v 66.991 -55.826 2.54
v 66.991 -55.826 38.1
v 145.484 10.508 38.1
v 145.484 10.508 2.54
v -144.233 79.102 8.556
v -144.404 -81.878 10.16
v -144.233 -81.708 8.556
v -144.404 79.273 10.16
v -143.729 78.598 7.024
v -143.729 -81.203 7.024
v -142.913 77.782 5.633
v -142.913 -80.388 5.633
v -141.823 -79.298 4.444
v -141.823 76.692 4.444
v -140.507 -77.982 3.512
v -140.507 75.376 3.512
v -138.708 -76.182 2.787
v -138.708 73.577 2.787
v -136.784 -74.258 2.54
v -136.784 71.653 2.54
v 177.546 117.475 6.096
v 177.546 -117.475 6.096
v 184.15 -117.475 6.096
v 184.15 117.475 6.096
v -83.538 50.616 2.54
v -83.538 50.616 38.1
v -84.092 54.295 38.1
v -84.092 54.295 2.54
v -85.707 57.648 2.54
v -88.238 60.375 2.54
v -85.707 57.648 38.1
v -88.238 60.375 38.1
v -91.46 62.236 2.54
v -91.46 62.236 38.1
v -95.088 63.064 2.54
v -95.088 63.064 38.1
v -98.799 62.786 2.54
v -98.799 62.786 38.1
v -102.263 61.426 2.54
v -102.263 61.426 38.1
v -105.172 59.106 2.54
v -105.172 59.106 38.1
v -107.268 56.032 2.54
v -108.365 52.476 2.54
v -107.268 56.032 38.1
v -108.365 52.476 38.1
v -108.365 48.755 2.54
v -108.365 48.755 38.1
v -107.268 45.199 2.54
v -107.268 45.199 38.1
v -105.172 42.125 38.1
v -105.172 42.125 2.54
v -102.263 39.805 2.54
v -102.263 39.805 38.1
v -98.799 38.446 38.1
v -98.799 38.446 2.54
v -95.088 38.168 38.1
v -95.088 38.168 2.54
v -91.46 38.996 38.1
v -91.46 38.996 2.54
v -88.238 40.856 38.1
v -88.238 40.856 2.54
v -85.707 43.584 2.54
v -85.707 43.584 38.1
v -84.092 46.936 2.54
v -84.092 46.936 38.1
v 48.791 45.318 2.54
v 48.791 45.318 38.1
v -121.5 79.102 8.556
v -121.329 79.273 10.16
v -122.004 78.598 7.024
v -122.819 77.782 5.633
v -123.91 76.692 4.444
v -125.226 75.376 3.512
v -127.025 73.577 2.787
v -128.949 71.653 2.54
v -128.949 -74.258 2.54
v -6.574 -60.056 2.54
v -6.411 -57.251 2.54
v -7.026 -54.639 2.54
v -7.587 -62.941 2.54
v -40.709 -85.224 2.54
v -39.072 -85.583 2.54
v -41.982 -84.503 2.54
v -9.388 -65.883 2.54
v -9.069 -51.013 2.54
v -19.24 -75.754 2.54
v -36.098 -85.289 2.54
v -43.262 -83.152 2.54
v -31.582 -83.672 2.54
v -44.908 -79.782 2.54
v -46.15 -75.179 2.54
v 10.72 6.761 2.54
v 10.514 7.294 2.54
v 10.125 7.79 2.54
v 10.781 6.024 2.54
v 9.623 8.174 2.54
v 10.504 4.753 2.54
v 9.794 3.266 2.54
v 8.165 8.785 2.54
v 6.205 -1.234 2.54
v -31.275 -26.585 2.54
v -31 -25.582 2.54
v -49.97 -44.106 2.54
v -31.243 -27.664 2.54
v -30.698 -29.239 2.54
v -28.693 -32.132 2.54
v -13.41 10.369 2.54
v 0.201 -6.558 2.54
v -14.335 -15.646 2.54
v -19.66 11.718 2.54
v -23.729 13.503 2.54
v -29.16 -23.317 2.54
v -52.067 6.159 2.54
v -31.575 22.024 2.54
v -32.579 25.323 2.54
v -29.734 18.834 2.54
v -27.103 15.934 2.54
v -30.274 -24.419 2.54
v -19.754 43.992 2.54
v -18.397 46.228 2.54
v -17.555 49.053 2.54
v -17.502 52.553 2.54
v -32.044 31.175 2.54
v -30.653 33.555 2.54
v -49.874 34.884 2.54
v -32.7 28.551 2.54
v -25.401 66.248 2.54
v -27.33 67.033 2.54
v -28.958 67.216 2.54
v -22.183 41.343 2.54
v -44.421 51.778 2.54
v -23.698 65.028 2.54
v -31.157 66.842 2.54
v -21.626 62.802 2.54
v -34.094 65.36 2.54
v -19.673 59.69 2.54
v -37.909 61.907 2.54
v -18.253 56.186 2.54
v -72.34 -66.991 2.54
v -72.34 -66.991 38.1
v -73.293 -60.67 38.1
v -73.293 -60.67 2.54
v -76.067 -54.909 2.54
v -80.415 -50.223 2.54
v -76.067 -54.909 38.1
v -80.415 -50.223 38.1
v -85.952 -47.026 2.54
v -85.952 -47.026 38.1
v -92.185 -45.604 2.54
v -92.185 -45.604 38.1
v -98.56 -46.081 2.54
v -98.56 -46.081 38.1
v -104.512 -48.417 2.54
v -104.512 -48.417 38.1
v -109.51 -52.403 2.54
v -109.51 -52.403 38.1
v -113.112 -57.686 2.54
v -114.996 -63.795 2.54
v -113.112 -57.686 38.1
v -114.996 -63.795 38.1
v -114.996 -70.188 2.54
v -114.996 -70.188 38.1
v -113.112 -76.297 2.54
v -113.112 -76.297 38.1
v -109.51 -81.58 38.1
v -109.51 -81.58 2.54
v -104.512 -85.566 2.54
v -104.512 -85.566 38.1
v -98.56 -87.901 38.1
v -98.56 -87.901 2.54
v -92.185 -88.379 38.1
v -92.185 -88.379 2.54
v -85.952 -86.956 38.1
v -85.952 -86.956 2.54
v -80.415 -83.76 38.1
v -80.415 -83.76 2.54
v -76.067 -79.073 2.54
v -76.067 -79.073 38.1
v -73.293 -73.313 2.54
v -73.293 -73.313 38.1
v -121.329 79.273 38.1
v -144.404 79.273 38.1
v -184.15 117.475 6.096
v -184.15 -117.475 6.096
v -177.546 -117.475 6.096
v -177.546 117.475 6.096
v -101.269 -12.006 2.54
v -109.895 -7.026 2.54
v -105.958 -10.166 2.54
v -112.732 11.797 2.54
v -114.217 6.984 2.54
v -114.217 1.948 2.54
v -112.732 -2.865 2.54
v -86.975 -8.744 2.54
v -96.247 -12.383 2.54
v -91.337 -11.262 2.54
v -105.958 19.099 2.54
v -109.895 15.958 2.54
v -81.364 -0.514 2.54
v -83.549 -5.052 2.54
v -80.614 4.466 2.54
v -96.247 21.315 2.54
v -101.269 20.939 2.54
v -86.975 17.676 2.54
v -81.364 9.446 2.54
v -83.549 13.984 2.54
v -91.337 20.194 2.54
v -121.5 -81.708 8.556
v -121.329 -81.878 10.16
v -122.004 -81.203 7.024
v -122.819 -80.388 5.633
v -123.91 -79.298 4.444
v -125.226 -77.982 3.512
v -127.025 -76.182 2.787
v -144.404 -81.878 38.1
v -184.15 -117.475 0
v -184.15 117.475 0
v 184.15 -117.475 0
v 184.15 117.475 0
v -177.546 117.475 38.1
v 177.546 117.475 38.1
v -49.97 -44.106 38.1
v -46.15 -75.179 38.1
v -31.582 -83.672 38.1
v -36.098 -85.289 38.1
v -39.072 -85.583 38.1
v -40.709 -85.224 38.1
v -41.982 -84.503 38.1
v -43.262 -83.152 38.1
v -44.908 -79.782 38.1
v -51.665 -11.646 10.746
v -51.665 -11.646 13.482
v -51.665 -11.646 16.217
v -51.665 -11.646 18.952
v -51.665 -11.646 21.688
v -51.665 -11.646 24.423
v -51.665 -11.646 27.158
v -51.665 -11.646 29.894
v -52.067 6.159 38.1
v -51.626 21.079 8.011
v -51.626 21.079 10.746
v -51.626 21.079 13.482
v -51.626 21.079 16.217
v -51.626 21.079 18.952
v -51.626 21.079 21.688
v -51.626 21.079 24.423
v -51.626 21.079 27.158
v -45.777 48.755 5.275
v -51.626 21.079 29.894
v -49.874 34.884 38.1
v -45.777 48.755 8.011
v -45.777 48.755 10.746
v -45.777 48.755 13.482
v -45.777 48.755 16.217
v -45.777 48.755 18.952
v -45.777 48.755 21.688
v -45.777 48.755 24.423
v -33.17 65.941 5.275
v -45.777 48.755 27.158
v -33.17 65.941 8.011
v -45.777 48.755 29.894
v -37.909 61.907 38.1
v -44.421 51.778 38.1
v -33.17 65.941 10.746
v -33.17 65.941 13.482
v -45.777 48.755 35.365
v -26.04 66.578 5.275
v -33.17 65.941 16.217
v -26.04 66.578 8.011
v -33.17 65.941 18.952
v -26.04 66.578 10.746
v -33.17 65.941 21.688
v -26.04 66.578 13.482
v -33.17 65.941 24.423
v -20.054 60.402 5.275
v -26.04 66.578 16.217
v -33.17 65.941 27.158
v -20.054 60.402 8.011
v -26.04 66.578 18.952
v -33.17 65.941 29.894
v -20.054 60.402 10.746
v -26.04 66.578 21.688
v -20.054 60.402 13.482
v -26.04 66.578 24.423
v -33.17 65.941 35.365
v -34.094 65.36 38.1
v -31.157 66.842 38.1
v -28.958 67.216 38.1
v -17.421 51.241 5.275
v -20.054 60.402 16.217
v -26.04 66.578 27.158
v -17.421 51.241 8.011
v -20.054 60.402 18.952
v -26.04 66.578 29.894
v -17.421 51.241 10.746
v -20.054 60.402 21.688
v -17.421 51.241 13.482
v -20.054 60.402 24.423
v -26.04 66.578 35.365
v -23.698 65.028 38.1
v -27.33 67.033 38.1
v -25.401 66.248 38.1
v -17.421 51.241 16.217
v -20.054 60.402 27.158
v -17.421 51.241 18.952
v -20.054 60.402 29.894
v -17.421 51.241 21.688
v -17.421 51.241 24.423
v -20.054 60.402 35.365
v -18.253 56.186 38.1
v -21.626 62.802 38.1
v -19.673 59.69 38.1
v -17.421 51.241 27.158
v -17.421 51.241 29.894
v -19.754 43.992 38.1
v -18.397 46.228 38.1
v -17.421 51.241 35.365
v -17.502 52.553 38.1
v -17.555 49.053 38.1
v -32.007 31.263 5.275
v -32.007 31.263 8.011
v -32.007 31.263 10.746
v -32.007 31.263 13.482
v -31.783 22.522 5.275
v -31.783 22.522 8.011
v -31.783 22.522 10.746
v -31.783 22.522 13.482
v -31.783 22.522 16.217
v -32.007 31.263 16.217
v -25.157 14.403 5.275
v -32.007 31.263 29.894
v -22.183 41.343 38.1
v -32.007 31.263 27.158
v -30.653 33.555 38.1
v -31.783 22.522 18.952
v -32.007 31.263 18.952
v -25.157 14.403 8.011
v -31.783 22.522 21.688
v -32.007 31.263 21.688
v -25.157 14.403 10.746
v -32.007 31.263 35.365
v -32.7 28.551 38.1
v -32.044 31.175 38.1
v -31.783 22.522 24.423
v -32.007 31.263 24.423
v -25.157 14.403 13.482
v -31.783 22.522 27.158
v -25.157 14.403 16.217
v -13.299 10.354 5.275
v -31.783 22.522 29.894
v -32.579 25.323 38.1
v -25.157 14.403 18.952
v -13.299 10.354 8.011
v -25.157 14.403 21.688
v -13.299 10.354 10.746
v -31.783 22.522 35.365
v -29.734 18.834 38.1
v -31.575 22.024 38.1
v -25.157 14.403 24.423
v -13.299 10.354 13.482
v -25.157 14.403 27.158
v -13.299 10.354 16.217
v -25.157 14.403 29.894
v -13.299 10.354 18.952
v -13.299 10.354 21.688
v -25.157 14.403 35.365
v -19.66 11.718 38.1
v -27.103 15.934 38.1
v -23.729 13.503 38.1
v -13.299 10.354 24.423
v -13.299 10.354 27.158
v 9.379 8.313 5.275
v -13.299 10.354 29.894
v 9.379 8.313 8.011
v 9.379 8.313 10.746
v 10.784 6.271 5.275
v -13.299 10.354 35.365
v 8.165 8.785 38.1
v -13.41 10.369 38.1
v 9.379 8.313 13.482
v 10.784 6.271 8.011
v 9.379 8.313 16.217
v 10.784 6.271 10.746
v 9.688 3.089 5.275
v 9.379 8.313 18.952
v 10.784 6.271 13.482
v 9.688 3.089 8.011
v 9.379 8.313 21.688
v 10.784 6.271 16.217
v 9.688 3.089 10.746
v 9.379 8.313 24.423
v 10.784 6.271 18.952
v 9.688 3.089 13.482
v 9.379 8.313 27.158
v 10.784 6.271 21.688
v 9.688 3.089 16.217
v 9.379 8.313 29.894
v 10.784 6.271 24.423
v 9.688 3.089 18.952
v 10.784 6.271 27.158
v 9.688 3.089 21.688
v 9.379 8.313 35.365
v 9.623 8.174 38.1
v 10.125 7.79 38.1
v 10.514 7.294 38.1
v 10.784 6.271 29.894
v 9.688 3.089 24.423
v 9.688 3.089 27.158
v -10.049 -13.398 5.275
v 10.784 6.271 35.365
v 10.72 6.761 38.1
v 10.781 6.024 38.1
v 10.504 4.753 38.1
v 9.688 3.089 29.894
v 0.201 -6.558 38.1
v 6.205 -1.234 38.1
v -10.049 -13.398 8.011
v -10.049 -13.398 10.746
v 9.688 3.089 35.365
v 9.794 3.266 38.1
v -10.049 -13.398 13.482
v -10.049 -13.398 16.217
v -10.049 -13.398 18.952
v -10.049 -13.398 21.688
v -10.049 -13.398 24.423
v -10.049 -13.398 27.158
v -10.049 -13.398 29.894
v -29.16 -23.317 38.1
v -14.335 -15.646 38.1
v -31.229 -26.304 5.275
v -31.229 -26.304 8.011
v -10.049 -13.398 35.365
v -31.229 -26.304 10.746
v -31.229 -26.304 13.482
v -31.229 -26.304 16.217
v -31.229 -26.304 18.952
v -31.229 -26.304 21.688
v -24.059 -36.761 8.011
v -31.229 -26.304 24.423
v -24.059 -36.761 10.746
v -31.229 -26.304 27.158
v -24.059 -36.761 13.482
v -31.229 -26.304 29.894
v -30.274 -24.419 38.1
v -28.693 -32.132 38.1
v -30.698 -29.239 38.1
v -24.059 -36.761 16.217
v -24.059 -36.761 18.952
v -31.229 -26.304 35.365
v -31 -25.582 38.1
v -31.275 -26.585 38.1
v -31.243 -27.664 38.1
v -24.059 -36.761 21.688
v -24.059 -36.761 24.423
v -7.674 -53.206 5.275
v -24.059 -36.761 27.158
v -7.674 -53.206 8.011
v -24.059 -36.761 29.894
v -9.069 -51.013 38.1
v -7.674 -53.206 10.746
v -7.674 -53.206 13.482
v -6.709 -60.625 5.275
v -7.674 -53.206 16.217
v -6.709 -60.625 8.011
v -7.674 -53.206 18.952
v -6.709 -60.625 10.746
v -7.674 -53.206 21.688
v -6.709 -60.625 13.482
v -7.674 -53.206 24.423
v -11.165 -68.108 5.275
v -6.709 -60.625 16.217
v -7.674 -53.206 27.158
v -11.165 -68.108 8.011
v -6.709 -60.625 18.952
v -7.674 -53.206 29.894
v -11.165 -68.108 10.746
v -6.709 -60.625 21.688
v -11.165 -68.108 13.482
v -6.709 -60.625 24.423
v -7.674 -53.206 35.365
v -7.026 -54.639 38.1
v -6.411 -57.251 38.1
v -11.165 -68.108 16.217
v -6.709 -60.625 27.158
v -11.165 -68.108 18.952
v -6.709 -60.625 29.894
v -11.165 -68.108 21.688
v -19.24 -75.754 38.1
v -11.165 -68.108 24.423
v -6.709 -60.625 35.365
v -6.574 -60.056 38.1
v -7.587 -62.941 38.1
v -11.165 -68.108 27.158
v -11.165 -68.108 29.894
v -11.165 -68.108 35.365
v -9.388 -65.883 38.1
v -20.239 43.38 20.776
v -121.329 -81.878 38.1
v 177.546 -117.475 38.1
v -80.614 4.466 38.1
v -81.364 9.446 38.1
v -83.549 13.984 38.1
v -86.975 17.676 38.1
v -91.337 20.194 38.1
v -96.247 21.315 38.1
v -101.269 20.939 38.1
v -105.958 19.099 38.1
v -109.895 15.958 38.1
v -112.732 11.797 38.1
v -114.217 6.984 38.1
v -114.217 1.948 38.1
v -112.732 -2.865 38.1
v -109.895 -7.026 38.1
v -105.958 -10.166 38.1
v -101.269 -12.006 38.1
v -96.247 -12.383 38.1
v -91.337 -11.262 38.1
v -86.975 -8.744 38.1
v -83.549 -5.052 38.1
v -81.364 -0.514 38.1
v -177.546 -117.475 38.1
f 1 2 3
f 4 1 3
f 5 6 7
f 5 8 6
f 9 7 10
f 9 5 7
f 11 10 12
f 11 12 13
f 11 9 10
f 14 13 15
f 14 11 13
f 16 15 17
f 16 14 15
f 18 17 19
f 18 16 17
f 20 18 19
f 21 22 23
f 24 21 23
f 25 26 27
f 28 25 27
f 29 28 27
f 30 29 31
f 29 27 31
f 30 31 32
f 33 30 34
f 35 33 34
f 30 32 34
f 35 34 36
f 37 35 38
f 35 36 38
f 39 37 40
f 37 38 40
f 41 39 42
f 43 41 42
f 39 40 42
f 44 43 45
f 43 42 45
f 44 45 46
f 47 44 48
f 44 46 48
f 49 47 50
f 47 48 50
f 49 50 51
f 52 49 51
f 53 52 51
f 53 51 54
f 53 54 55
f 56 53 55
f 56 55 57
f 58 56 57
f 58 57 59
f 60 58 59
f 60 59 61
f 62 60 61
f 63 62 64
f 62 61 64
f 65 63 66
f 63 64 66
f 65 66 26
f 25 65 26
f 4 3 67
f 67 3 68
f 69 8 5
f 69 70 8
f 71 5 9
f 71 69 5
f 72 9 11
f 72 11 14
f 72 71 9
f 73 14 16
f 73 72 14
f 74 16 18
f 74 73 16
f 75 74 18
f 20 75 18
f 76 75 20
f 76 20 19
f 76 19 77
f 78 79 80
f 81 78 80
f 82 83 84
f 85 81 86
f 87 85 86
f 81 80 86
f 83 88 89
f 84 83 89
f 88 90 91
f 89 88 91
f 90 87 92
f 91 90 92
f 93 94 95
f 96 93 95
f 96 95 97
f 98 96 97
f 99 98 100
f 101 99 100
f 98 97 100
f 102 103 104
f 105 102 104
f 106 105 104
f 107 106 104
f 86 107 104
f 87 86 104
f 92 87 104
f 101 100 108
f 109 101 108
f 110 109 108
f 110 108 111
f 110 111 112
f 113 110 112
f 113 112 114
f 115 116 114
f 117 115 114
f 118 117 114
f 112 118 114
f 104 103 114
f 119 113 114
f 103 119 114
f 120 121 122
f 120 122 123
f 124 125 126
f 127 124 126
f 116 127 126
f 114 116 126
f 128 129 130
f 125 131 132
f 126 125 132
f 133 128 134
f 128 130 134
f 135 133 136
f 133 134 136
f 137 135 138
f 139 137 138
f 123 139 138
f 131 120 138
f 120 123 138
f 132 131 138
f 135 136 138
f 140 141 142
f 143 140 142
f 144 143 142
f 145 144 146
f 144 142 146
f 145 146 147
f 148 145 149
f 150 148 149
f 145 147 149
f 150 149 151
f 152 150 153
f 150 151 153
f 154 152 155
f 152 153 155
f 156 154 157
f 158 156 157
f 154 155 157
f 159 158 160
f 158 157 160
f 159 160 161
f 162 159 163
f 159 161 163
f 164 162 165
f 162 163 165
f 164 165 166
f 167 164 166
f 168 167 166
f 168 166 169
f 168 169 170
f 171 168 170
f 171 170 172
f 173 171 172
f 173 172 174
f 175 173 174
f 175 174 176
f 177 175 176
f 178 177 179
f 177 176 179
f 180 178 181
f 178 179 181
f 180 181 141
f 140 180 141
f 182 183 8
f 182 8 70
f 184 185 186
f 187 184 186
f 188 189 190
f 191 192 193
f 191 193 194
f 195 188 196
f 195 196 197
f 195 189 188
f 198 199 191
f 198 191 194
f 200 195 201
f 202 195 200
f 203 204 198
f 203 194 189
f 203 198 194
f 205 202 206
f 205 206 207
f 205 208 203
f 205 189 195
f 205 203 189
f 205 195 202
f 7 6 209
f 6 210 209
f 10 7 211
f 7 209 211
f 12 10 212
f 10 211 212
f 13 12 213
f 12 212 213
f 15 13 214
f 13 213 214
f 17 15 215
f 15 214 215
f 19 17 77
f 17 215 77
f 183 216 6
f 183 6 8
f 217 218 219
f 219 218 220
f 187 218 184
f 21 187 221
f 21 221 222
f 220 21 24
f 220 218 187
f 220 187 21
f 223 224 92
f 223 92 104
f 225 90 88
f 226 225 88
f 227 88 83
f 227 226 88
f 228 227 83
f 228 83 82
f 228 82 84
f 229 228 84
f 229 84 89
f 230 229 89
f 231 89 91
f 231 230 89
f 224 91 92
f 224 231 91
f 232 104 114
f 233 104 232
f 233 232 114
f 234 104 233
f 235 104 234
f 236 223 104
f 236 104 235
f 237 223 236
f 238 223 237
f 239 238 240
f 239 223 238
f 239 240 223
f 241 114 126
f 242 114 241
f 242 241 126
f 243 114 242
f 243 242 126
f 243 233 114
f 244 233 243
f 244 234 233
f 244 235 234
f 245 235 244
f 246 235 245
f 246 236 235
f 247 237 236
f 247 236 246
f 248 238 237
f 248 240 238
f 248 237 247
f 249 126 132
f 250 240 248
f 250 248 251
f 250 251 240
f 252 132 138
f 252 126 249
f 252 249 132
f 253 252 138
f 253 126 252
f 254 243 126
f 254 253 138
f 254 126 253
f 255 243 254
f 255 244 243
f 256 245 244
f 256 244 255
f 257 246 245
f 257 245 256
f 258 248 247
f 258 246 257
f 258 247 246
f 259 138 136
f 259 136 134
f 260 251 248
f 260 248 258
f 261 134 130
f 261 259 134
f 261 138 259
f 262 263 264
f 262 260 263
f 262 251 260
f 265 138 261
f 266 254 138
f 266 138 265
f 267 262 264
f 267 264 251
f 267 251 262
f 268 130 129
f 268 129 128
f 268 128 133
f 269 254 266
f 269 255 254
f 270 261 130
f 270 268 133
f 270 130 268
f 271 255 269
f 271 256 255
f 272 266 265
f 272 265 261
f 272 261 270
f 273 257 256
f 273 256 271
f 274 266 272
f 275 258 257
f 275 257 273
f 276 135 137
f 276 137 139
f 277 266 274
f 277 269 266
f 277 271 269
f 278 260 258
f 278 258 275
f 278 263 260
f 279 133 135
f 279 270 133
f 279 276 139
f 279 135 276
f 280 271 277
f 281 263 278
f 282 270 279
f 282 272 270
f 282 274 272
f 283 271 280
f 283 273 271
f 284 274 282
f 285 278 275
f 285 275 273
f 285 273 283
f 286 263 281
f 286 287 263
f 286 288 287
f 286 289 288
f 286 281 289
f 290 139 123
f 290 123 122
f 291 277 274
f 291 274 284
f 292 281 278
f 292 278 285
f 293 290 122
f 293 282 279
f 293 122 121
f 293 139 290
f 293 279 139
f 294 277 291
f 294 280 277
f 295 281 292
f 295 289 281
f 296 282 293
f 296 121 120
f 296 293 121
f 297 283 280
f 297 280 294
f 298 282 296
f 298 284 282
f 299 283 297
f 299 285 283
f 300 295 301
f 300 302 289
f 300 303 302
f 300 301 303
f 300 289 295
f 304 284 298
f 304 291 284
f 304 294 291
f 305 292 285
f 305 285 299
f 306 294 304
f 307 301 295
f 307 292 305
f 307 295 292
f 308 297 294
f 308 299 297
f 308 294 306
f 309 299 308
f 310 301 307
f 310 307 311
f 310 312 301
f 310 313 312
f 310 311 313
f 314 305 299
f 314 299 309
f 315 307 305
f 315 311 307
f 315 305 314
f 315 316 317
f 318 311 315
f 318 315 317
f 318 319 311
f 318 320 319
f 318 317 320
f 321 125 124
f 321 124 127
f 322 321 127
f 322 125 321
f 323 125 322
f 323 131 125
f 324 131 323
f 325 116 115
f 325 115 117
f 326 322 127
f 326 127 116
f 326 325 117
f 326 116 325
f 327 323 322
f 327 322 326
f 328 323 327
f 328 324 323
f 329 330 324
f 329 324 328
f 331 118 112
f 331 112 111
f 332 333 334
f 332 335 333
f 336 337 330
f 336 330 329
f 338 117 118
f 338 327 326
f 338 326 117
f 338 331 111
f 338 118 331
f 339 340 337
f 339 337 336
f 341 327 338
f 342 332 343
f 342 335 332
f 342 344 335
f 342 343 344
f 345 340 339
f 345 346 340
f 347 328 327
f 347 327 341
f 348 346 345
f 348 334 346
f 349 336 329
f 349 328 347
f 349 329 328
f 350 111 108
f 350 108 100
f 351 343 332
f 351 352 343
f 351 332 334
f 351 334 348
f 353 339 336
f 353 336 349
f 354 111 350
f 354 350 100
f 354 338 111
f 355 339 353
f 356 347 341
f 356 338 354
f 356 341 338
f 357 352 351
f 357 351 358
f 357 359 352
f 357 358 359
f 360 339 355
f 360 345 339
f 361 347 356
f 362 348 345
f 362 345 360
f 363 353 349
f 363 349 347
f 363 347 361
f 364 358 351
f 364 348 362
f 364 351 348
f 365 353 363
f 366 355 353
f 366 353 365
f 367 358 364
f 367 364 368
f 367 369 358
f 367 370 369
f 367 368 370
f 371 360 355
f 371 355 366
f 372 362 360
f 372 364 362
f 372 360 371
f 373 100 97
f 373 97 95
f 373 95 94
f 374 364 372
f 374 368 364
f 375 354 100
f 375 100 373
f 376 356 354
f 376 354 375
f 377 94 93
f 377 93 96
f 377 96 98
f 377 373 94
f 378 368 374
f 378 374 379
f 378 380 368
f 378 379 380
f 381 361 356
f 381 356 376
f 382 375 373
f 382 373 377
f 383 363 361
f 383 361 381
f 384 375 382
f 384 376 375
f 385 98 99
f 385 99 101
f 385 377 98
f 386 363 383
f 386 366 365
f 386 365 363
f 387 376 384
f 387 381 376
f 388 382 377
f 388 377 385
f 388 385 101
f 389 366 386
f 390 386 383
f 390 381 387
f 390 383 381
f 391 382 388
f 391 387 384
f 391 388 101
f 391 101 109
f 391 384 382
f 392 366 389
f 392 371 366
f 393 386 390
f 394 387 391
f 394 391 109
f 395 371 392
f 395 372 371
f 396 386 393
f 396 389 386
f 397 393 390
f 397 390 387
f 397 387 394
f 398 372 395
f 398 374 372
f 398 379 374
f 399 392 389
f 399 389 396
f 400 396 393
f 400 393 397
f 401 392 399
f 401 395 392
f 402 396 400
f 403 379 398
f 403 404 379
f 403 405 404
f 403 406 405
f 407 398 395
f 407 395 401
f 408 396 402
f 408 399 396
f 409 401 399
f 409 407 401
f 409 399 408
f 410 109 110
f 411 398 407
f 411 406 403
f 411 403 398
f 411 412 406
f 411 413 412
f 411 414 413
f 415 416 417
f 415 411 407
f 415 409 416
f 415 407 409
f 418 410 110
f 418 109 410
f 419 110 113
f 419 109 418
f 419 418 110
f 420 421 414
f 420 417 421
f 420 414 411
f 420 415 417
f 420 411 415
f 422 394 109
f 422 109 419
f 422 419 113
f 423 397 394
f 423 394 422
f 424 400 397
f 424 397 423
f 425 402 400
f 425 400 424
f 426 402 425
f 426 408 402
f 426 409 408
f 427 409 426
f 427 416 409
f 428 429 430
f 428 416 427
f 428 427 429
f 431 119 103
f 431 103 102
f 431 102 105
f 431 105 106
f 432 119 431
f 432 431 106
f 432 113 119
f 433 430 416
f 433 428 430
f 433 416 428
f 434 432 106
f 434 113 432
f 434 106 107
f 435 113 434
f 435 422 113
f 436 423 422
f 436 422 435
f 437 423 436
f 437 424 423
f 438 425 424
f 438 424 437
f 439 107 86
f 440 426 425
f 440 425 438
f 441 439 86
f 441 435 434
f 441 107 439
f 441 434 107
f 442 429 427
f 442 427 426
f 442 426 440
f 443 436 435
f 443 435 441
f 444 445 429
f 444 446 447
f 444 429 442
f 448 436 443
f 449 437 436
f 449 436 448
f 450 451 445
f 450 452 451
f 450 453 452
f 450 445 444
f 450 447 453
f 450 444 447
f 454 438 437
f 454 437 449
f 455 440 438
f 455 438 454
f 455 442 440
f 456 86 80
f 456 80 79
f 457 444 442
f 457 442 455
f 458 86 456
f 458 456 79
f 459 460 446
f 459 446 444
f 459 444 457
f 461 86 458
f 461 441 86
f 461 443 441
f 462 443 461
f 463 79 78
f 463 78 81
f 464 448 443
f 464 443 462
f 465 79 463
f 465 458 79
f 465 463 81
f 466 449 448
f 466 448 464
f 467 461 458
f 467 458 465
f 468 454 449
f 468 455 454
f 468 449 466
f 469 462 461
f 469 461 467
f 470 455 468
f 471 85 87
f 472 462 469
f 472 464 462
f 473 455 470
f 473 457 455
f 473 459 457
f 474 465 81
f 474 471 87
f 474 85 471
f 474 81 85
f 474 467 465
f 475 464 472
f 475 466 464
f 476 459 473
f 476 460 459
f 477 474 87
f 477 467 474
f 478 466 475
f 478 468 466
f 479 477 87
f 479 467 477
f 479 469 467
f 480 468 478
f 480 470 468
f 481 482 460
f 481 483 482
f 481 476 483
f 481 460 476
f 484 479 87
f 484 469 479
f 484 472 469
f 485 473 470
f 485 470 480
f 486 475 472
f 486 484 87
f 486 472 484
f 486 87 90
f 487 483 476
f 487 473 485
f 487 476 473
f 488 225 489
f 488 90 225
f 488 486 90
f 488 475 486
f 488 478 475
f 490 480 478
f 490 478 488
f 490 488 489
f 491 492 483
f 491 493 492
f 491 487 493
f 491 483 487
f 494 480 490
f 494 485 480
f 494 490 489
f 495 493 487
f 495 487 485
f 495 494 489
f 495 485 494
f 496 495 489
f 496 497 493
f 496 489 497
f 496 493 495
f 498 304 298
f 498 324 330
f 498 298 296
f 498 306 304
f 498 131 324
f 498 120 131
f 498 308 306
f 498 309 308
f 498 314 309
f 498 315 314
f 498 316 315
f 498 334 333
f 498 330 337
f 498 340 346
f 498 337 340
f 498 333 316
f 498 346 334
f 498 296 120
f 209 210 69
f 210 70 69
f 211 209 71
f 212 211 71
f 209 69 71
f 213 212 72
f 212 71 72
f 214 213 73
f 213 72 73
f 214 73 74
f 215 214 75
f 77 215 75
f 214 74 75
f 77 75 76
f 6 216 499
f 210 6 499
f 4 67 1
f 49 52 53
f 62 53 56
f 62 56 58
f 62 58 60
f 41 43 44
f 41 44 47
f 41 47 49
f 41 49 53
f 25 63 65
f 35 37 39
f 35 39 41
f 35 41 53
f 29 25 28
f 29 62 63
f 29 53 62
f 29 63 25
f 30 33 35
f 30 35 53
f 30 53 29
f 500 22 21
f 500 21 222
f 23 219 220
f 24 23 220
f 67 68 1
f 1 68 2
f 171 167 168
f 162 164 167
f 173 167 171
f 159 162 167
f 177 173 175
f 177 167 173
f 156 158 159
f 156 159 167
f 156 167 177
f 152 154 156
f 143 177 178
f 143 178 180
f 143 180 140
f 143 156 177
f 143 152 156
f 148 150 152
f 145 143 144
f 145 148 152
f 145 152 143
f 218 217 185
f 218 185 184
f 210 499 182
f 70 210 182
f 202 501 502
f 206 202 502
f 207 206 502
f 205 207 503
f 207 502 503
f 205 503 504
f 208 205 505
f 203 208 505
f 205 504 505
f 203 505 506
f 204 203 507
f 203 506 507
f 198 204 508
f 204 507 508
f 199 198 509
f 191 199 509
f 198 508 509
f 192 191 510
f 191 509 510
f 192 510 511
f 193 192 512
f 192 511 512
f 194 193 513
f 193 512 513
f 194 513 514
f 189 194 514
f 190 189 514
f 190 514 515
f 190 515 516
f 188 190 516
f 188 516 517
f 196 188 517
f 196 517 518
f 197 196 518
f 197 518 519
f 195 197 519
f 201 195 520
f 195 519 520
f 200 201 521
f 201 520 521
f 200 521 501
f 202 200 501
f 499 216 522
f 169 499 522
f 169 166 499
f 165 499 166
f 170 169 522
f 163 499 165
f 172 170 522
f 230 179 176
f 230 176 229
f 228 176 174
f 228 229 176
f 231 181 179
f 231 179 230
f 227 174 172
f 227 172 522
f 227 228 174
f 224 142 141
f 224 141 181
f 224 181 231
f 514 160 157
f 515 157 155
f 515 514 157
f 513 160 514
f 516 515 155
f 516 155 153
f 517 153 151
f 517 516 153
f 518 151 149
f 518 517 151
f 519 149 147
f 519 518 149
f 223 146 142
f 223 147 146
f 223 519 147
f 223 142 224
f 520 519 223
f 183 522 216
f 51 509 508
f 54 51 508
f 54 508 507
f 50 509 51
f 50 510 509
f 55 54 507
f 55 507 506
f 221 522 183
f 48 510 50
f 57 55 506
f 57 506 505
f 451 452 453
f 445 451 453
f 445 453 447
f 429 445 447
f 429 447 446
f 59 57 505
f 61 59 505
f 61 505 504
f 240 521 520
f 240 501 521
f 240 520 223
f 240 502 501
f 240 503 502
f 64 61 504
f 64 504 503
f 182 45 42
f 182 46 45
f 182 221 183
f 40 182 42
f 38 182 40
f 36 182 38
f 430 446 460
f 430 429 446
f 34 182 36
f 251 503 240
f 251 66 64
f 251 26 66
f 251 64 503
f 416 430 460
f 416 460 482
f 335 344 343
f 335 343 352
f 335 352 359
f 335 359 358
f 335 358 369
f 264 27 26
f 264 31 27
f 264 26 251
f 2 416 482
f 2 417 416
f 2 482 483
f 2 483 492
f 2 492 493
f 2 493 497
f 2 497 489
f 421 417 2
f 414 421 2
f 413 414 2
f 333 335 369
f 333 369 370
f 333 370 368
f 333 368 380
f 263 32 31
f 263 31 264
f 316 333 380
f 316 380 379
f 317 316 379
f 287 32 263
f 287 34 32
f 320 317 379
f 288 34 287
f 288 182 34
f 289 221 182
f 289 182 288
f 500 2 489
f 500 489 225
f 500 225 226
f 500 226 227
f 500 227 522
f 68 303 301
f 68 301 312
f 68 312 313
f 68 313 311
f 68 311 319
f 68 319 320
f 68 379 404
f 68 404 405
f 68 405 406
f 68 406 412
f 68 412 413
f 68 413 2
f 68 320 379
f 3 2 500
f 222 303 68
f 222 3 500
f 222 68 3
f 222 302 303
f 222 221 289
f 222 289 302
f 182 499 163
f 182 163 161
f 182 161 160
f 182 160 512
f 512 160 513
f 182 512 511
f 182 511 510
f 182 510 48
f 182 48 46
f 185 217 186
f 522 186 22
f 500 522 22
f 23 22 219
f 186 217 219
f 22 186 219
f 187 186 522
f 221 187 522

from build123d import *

# Parameters (mm, degrees)
F0_W     = 368.3
F0_H     = 234.95
F1_DEPTH = 38.1
F2_W     = 6.604
F2_H     = 32.004
F3_DEPTH = 234.951
F4_R     = 16.8960598702
F4_R_2   = 21.4477044948
F4_W     = 23.0748131871
F4_H     = 161.1514985561
F4_R_3   = 12.4831112704
F5_DEPTH = 35.56
F6_R     = 7.62


with BuildPart() as f1:
    # F0 (on Top) → F1 (new body)
    with BuildSketch(Plane.XY):
        Rectangle(F0_W, F0_H)
    extrude(amount=F1_DEPTH)

    # F2 (on face) → F3 (cut, through all)
    with BuildSketch(Plane.XZ.offset(117.475)):
        with Locations((180.848, 22.098)):
            Rectangle(F2_W, F2_H)
        with Locations((-180.848, 22.098)):
            Rectangle(F2_W, F2_H)
    extrude(amount=-F3_DEPTH, mode=Mode.SUBTRACT)

    # F4 (on face) → F5 (cut)
    with BuildSketch(Plane.XY.offset(38.1)):
        with BuildLine():
            add(Edge.make_bspline(
                [(-46.1496077478, -75.1792117953), (-49.3186279348, -60.6904518614), (-52.4598845595, -7.9087934106), (-52.5301794964, 45.6558860892), (-27.0101126446, 77.186916711), (-10.4710171081, 43.8396118699), (-38.9306329093, 34.1741312423), (-25.0554307802, 4.9086663528), (24.8994478008, 14.7435687242), (-9.0404651832, -16.7182072693), (-44.7013135767, -25.0884012199), (-2.5046643875, -50.5573295528), (-8.3693665776, -69.2660043872), (-40.33373303, -91.7806813493), (-44.7509198876, -81.5740125329), (-46.1496077478, -75.1792117953)],
                knots=[0, 0, 0, 0, 0.1157160493, 0.2250923254, 0.2979411693, 0.3640759595, 0.4304625959, 0.4971515908, 0.5778883555, 0.6550256298, 0.7270889253, 0.8092921071, 0.8674075577, 0.9489272318, 1, 1, 1, 1], degree=3))
        make_face()
        with Locations((-97.5096747279, 4.4660978019)):
            Circle(F4_R)
        with Locations((-93.7879234552, -66.9913738966)):
            Circle(F4_R_2)
        with Locations((-132.866229862, -1.3026073575)):
            Rectangle(F4_W, F4_H)
        with Locations((-96.0209742188, 50.6157167256)):
            Circle(F4_R_3)
        Polygon((145.4843993486, 10.5082045873), (48.7906520068, 45.3179564694), (66.9913962483, -55.8261610568), align=None)
    extrude(amount=-F5_DEPTH, mode=Mode.SUBTRACT)

    # F6
    f6_edges = [f1.edges().sort_by_distance(p)[0] for p in [
        (-144.403636, -1.302607, 2.54),
        (-132.86623, -81.878357, 2.54),
        (-121.328823, -1.302607, 2.54),
        (-132.86623, 79.273142, 2.54),
    ]]
    fillet(f6_edges, radius=F6_R)


solid = f1.part
